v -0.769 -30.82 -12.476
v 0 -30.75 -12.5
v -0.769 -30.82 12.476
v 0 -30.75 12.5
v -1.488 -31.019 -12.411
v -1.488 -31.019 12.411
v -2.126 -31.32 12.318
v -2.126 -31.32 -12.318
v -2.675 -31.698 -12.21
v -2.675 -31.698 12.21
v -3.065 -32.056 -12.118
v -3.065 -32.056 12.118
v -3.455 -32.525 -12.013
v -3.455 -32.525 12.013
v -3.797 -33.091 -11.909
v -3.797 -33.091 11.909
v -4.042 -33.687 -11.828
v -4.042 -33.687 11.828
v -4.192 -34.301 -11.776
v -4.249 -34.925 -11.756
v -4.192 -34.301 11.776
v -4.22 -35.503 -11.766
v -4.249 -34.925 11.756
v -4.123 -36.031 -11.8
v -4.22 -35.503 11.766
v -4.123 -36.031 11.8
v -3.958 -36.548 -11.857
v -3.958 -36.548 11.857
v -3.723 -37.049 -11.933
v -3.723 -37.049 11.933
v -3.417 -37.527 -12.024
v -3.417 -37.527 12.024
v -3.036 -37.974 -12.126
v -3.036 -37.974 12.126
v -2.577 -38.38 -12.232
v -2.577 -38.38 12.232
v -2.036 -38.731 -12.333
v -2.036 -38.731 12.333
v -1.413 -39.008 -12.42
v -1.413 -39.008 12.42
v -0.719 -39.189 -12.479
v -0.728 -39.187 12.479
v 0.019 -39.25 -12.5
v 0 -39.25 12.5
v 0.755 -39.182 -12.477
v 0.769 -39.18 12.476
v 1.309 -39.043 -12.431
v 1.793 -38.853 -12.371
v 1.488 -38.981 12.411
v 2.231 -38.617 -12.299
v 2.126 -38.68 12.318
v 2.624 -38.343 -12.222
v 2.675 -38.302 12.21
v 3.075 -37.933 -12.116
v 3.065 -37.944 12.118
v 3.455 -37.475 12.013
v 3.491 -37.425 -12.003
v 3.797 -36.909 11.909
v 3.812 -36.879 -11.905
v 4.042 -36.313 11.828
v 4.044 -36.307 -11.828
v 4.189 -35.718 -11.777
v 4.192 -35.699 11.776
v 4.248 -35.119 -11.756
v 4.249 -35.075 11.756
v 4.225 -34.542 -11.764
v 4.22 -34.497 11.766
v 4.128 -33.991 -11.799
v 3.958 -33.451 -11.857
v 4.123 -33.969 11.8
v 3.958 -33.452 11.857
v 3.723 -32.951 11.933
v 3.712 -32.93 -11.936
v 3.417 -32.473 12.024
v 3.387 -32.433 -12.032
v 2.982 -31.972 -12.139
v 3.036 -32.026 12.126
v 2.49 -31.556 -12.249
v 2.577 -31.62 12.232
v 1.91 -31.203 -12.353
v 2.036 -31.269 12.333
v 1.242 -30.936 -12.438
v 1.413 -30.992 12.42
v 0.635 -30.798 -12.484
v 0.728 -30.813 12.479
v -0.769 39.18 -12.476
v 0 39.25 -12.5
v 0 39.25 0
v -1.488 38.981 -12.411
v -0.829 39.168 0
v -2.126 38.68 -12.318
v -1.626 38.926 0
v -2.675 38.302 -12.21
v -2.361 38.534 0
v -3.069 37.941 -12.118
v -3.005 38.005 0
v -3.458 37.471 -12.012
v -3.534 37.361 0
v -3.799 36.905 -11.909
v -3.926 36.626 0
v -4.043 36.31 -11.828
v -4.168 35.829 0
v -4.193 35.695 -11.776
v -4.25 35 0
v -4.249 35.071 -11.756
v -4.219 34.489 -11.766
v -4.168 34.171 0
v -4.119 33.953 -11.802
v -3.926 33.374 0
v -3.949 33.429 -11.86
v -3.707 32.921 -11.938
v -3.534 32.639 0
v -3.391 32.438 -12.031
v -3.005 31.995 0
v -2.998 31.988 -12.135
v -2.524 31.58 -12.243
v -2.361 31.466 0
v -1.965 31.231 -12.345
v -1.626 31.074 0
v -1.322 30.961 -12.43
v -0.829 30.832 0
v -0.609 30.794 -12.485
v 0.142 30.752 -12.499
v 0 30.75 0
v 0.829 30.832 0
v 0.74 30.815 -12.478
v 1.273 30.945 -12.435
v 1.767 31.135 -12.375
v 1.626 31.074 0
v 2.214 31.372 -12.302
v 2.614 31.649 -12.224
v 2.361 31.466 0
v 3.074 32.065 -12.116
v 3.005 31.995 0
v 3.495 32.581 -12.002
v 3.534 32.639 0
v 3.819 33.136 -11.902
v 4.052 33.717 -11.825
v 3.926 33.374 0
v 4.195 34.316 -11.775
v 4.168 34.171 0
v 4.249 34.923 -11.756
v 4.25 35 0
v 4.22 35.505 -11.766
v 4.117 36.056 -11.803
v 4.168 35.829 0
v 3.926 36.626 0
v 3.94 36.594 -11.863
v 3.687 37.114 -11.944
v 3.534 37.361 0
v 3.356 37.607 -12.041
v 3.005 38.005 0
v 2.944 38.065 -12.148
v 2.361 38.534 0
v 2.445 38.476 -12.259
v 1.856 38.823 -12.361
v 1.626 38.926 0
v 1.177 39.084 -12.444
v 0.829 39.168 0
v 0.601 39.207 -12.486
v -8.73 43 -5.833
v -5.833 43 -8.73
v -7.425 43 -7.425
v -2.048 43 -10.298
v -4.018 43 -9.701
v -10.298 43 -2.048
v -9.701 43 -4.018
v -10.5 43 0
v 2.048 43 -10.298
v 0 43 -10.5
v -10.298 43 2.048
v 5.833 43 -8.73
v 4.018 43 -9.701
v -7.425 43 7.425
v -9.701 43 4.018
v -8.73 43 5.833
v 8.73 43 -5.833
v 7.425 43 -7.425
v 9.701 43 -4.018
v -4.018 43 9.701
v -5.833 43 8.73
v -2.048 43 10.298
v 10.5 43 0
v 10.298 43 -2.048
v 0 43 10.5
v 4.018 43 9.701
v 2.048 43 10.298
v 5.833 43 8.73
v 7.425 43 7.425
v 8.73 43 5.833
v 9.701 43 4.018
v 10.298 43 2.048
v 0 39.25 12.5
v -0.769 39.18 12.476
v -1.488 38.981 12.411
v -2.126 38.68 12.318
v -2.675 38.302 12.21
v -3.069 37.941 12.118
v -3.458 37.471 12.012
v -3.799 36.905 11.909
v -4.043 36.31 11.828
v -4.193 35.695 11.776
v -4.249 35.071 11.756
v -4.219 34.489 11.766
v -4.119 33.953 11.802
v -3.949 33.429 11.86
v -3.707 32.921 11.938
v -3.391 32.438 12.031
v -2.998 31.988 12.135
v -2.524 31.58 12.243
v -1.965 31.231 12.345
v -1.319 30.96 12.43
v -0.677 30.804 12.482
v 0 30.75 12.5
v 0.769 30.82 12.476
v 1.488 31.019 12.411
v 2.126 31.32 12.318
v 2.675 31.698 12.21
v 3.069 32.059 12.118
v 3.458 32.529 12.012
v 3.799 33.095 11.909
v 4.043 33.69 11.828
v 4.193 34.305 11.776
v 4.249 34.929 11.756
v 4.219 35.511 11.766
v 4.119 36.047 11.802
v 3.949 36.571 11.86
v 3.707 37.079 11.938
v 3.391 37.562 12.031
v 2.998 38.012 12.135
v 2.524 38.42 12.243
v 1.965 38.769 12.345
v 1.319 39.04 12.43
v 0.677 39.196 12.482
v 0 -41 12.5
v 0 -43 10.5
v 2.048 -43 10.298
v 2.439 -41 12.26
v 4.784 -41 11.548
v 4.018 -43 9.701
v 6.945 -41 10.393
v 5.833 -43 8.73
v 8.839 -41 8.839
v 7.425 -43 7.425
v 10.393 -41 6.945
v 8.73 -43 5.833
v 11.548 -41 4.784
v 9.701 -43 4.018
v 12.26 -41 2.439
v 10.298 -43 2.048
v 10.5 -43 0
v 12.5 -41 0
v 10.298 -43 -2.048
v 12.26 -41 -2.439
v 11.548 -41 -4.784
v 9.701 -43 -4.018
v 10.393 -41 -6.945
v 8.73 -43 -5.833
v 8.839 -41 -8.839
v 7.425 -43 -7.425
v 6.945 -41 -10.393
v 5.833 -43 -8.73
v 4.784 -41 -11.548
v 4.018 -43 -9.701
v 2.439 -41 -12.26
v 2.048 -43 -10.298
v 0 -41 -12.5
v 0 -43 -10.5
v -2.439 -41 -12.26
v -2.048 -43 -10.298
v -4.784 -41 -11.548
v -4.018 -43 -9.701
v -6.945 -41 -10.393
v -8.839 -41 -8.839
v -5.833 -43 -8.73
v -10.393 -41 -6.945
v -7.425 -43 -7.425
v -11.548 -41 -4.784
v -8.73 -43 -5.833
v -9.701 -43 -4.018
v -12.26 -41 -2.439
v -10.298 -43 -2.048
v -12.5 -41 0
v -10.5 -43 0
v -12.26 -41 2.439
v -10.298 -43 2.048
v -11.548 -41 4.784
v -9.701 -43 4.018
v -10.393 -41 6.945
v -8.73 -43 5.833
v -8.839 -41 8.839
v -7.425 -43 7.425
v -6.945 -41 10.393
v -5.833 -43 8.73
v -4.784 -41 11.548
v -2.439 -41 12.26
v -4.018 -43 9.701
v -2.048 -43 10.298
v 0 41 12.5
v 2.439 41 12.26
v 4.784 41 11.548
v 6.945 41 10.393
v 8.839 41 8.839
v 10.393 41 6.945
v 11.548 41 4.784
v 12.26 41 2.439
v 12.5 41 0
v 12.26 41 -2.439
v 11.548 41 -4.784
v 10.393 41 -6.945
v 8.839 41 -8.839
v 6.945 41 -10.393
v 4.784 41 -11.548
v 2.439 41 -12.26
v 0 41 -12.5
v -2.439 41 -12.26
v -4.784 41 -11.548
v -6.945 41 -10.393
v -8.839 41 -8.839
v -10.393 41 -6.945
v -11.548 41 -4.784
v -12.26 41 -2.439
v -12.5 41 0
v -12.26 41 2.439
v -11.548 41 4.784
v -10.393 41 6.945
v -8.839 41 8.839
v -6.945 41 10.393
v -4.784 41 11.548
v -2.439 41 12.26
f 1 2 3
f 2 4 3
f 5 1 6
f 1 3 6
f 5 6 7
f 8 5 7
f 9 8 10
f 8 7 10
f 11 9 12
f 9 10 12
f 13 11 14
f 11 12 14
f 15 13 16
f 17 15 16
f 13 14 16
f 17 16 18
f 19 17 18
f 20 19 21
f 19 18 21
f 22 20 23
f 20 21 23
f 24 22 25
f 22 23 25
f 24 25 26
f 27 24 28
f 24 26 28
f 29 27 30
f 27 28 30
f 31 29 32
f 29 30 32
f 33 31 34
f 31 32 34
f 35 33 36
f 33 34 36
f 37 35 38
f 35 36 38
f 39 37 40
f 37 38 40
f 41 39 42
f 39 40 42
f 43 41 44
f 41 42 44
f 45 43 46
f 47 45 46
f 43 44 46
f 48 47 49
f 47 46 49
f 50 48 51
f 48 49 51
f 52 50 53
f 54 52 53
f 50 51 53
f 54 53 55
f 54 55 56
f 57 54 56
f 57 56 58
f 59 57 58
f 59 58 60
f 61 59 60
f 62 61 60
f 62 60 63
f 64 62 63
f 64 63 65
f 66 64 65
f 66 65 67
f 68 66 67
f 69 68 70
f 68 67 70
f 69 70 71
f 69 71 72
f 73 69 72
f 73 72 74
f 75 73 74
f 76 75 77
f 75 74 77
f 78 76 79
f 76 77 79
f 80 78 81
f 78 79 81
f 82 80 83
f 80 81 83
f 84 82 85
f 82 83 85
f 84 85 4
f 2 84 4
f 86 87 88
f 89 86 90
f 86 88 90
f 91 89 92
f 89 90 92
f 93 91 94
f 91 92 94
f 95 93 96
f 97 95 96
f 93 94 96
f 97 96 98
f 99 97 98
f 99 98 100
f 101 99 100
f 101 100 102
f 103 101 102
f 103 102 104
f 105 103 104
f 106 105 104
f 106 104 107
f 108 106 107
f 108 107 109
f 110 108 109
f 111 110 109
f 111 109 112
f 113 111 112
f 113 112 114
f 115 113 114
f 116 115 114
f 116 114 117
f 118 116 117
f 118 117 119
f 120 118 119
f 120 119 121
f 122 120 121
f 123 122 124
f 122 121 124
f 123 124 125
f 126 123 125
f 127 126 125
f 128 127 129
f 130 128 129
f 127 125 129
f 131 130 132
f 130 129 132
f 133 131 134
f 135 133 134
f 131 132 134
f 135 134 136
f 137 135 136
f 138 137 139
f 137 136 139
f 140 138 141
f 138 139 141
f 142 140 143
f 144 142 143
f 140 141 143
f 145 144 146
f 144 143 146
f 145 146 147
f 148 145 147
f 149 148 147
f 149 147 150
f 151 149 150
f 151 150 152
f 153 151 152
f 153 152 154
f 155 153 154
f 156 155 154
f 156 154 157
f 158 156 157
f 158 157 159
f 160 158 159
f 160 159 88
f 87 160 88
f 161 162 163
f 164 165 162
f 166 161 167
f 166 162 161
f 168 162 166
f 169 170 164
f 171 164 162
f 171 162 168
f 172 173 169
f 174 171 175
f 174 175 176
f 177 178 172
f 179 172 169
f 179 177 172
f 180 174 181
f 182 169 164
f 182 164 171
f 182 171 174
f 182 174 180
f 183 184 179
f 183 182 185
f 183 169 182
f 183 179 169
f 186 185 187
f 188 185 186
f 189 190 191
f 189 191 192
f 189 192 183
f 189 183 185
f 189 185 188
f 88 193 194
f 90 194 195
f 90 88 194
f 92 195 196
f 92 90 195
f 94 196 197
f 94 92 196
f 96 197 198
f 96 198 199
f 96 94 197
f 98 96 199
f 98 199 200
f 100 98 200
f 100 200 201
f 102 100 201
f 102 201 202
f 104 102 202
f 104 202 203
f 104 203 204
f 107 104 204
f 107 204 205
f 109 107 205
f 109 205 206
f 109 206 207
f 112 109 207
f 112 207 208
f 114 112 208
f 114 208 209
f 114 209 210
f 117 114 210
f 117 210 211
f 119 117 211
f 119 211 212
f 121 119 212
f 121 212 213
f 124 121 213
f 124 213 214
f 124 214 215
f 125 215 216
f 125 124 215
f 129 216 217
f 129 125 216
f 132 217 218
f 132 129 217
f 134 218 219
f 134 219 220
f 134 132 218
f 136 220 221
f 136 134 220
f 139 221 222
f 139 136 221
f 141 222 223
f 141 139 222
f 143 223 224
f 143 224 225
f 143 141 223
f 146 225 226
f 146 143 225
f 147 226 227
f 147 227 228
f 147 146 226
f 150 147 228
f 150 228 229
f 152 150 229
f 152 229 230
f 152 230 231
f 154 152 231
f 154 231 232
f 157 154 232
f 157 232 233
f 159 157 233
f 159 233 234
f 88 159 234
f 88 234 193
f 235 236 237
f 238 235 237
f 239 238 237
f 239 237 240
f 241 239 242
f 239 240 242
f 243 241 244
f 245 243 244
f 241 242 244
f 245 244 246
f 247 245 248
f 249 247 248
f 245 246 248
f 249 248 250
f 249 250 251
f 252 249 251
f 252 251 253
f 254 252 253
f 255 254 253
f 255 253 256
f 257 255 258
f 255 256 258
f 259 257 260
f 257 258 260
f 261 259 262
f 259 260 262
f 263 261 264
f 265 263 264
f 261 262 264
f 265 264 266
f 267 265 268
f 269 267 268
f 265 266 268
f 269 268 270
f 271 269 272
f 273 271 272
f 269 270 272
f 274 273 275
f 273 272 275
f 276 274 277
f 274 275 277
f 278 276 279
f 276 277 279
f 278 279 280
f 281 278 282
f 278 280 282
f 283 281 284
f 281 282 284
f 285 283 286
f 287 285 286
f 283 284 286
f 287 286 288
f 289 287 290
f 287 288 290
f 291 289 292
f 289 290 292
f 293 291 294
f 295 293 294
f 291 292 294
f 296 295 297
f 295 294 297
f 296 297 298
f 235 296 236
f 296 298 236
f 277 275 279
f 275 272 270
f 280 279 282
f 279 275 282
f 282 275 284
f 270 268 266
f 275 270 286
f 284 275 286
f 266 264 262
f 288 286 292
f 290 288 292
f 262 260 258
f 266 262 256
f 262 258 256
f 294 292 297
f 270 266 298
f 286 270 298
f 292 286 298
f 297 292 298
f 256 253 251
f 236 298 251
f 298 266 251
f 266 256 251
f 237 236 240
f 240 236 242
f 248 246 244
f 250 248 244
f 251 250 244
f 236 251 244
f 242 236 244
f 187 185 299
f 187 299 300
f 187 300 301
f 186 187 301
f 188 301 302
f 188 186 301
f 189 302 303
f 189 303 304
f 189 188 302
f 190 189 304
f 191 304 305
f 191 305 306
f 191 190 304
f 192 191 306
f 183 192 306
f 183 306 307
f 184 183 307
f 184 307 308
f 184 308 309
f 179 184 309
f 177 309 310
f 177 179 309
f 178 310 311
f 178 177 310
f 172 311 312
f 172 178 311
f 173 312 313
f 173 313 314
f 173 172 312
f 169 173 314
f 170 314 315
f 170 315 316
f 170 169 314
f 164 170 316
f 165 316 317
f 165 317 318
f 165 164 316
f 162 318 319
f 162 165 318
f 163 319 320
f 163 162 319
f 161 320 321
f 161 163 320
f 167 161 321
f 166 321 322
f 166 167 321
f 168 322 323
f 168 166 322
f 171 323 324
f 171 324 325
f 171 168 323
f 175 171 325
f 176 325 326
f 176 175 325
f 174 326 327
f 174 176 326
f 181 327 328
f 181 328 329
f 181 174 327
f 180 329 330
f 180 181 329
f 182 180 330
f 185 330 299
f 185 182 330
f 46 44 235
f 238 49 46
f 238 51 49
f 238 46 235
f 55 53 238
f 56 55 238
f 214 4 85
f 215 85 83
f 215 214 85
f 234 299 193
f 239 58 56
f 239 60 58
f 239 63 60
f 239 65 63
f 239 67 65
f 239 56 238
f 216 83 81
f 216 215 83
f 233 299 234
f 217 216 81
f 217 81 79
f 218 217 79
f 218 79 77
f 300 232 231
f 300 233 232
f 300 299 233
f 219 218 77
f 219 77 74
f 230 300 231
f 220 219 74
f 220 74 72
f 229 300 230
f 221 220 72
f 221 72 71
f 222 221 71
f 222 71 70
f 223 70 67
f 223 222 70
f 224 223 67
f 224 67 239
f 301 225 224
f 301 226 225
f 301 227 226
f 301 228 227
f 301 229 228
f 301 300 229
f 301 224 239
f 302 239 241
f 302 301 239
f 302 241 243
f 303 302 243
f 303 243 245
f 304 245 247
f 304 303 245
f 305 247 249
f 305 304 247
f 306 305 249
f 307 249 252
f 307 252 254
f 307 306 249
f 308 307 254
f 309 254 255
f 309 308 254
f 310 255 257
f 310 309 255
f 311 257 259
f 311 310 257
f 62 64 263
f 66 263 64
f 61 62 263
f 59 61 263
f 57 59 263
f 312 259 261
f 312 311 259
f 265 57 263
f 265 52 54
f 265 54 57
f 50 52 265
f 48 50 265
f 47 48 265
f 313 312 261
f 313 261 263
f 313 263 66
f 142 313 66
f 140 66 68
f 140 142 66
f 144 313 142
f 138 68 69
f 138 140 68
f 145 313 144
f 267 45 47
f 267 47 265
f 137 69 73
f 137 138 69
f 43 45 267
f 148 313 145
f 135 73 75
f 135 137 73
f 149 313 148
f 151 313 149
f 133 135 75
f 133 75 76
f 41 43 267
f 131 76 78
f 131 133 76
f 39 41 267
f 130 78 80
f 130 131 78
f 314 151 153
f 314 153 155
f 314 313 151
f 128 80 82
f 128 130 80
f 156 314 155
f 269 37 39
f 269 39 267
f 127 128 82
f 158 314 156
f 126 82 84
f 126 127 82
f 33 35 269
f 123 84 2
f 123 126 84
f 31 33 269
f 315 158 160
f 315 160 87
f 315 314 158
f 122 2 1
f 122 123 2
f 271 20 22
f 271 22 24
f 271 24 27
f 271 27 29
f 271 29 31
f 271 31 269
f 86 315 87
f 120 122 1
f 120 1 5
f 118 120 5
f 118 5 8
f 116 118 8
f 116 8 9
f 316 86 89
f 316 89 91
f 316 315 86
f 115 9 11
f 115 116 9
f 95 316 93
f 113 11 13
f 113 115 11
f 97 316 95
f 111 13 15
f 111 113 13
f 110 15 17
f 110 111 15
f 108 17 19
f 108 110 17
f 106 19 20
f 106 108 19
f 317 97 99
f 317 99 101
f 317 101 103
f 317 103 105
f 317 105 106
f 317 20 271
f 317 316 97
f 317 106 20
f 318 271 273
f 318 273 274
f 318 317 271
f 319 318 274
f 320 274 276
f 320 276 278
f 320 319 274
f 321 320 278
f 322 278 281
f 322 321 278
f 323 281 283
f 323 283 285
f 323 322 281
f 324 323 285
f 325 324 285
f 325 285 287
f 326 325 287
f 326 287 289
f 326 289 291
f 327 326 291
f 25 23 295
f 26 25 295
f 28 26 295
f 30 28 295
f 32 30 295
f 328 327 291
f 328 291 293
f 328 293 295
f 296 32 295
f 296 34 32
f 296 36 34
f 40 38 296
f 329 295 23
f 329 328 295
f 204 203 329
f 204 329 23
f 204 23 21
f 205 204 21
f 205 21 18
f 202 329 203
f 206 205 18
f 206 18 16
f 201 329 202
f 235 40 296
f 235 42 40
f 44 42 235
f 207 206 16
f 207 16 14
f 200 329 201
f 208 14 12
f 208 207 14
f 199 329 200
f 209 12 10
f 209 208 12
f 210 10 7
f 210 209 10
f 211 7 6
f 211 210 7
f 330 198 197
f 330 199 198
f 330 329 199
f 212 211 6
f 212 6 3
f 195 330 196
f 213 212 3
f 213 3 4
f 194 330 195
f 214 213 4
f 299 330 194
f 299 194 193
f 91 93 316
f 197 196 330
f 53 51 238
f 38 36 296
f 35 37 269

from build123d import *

# Parameters (mm, degrees)
ESBO_O1_R                = 12.5
RESSALTO_EXTRUS_O1_DEPTH = 43
CHANFRO1_SIZE            = 2
ESBO_O2_R                = 4.25
CORTE_EXTRUS_O1_DEPTH    = 43


with BuildPart() as part:
    # Esboço1 → Ressalto-extrusão1 (new, symmetric)
    with BuildSketch(Plane(origin=(0, 0, 0), x_dir=(1, 0, 0), z_dir=(0, 1, 0))):
        with Locations(Location((0, 0, 0), (0, 0, 270))):
            Circle(ESBO_O1_R)
    extrude(amount=RESSALTO_EXTRUS_O1_DEPTH, both=True)

    # Chanfro1
    chanfro1_edges = [part.edges().sort_by_distance(p)[0] for p in [
        (0, -43, -12.5),
        (0, 43, -12.5),
    ]]
    chamfer(chanfro1_edges, length=CHANFRO1_SIZE)

    # Esboço2 → Corte-extrusão1 (cut, symmetric)
    with BuildSketch(Plane.XY):
        with Locations(Location((0, 35, 0), (0, 0, 89.999999985))):
            Circle(ESBO_O2_R)
        with Locations(Location((0, -35, 0), (0, 0, 89.999999985))):
            Circle(ESBO_O2_R)
    extrude(amount=CORTE_EXTRUS_O1_DEPTH, both=True, mode=Mode.SUBTRACT)


solid = part.part
